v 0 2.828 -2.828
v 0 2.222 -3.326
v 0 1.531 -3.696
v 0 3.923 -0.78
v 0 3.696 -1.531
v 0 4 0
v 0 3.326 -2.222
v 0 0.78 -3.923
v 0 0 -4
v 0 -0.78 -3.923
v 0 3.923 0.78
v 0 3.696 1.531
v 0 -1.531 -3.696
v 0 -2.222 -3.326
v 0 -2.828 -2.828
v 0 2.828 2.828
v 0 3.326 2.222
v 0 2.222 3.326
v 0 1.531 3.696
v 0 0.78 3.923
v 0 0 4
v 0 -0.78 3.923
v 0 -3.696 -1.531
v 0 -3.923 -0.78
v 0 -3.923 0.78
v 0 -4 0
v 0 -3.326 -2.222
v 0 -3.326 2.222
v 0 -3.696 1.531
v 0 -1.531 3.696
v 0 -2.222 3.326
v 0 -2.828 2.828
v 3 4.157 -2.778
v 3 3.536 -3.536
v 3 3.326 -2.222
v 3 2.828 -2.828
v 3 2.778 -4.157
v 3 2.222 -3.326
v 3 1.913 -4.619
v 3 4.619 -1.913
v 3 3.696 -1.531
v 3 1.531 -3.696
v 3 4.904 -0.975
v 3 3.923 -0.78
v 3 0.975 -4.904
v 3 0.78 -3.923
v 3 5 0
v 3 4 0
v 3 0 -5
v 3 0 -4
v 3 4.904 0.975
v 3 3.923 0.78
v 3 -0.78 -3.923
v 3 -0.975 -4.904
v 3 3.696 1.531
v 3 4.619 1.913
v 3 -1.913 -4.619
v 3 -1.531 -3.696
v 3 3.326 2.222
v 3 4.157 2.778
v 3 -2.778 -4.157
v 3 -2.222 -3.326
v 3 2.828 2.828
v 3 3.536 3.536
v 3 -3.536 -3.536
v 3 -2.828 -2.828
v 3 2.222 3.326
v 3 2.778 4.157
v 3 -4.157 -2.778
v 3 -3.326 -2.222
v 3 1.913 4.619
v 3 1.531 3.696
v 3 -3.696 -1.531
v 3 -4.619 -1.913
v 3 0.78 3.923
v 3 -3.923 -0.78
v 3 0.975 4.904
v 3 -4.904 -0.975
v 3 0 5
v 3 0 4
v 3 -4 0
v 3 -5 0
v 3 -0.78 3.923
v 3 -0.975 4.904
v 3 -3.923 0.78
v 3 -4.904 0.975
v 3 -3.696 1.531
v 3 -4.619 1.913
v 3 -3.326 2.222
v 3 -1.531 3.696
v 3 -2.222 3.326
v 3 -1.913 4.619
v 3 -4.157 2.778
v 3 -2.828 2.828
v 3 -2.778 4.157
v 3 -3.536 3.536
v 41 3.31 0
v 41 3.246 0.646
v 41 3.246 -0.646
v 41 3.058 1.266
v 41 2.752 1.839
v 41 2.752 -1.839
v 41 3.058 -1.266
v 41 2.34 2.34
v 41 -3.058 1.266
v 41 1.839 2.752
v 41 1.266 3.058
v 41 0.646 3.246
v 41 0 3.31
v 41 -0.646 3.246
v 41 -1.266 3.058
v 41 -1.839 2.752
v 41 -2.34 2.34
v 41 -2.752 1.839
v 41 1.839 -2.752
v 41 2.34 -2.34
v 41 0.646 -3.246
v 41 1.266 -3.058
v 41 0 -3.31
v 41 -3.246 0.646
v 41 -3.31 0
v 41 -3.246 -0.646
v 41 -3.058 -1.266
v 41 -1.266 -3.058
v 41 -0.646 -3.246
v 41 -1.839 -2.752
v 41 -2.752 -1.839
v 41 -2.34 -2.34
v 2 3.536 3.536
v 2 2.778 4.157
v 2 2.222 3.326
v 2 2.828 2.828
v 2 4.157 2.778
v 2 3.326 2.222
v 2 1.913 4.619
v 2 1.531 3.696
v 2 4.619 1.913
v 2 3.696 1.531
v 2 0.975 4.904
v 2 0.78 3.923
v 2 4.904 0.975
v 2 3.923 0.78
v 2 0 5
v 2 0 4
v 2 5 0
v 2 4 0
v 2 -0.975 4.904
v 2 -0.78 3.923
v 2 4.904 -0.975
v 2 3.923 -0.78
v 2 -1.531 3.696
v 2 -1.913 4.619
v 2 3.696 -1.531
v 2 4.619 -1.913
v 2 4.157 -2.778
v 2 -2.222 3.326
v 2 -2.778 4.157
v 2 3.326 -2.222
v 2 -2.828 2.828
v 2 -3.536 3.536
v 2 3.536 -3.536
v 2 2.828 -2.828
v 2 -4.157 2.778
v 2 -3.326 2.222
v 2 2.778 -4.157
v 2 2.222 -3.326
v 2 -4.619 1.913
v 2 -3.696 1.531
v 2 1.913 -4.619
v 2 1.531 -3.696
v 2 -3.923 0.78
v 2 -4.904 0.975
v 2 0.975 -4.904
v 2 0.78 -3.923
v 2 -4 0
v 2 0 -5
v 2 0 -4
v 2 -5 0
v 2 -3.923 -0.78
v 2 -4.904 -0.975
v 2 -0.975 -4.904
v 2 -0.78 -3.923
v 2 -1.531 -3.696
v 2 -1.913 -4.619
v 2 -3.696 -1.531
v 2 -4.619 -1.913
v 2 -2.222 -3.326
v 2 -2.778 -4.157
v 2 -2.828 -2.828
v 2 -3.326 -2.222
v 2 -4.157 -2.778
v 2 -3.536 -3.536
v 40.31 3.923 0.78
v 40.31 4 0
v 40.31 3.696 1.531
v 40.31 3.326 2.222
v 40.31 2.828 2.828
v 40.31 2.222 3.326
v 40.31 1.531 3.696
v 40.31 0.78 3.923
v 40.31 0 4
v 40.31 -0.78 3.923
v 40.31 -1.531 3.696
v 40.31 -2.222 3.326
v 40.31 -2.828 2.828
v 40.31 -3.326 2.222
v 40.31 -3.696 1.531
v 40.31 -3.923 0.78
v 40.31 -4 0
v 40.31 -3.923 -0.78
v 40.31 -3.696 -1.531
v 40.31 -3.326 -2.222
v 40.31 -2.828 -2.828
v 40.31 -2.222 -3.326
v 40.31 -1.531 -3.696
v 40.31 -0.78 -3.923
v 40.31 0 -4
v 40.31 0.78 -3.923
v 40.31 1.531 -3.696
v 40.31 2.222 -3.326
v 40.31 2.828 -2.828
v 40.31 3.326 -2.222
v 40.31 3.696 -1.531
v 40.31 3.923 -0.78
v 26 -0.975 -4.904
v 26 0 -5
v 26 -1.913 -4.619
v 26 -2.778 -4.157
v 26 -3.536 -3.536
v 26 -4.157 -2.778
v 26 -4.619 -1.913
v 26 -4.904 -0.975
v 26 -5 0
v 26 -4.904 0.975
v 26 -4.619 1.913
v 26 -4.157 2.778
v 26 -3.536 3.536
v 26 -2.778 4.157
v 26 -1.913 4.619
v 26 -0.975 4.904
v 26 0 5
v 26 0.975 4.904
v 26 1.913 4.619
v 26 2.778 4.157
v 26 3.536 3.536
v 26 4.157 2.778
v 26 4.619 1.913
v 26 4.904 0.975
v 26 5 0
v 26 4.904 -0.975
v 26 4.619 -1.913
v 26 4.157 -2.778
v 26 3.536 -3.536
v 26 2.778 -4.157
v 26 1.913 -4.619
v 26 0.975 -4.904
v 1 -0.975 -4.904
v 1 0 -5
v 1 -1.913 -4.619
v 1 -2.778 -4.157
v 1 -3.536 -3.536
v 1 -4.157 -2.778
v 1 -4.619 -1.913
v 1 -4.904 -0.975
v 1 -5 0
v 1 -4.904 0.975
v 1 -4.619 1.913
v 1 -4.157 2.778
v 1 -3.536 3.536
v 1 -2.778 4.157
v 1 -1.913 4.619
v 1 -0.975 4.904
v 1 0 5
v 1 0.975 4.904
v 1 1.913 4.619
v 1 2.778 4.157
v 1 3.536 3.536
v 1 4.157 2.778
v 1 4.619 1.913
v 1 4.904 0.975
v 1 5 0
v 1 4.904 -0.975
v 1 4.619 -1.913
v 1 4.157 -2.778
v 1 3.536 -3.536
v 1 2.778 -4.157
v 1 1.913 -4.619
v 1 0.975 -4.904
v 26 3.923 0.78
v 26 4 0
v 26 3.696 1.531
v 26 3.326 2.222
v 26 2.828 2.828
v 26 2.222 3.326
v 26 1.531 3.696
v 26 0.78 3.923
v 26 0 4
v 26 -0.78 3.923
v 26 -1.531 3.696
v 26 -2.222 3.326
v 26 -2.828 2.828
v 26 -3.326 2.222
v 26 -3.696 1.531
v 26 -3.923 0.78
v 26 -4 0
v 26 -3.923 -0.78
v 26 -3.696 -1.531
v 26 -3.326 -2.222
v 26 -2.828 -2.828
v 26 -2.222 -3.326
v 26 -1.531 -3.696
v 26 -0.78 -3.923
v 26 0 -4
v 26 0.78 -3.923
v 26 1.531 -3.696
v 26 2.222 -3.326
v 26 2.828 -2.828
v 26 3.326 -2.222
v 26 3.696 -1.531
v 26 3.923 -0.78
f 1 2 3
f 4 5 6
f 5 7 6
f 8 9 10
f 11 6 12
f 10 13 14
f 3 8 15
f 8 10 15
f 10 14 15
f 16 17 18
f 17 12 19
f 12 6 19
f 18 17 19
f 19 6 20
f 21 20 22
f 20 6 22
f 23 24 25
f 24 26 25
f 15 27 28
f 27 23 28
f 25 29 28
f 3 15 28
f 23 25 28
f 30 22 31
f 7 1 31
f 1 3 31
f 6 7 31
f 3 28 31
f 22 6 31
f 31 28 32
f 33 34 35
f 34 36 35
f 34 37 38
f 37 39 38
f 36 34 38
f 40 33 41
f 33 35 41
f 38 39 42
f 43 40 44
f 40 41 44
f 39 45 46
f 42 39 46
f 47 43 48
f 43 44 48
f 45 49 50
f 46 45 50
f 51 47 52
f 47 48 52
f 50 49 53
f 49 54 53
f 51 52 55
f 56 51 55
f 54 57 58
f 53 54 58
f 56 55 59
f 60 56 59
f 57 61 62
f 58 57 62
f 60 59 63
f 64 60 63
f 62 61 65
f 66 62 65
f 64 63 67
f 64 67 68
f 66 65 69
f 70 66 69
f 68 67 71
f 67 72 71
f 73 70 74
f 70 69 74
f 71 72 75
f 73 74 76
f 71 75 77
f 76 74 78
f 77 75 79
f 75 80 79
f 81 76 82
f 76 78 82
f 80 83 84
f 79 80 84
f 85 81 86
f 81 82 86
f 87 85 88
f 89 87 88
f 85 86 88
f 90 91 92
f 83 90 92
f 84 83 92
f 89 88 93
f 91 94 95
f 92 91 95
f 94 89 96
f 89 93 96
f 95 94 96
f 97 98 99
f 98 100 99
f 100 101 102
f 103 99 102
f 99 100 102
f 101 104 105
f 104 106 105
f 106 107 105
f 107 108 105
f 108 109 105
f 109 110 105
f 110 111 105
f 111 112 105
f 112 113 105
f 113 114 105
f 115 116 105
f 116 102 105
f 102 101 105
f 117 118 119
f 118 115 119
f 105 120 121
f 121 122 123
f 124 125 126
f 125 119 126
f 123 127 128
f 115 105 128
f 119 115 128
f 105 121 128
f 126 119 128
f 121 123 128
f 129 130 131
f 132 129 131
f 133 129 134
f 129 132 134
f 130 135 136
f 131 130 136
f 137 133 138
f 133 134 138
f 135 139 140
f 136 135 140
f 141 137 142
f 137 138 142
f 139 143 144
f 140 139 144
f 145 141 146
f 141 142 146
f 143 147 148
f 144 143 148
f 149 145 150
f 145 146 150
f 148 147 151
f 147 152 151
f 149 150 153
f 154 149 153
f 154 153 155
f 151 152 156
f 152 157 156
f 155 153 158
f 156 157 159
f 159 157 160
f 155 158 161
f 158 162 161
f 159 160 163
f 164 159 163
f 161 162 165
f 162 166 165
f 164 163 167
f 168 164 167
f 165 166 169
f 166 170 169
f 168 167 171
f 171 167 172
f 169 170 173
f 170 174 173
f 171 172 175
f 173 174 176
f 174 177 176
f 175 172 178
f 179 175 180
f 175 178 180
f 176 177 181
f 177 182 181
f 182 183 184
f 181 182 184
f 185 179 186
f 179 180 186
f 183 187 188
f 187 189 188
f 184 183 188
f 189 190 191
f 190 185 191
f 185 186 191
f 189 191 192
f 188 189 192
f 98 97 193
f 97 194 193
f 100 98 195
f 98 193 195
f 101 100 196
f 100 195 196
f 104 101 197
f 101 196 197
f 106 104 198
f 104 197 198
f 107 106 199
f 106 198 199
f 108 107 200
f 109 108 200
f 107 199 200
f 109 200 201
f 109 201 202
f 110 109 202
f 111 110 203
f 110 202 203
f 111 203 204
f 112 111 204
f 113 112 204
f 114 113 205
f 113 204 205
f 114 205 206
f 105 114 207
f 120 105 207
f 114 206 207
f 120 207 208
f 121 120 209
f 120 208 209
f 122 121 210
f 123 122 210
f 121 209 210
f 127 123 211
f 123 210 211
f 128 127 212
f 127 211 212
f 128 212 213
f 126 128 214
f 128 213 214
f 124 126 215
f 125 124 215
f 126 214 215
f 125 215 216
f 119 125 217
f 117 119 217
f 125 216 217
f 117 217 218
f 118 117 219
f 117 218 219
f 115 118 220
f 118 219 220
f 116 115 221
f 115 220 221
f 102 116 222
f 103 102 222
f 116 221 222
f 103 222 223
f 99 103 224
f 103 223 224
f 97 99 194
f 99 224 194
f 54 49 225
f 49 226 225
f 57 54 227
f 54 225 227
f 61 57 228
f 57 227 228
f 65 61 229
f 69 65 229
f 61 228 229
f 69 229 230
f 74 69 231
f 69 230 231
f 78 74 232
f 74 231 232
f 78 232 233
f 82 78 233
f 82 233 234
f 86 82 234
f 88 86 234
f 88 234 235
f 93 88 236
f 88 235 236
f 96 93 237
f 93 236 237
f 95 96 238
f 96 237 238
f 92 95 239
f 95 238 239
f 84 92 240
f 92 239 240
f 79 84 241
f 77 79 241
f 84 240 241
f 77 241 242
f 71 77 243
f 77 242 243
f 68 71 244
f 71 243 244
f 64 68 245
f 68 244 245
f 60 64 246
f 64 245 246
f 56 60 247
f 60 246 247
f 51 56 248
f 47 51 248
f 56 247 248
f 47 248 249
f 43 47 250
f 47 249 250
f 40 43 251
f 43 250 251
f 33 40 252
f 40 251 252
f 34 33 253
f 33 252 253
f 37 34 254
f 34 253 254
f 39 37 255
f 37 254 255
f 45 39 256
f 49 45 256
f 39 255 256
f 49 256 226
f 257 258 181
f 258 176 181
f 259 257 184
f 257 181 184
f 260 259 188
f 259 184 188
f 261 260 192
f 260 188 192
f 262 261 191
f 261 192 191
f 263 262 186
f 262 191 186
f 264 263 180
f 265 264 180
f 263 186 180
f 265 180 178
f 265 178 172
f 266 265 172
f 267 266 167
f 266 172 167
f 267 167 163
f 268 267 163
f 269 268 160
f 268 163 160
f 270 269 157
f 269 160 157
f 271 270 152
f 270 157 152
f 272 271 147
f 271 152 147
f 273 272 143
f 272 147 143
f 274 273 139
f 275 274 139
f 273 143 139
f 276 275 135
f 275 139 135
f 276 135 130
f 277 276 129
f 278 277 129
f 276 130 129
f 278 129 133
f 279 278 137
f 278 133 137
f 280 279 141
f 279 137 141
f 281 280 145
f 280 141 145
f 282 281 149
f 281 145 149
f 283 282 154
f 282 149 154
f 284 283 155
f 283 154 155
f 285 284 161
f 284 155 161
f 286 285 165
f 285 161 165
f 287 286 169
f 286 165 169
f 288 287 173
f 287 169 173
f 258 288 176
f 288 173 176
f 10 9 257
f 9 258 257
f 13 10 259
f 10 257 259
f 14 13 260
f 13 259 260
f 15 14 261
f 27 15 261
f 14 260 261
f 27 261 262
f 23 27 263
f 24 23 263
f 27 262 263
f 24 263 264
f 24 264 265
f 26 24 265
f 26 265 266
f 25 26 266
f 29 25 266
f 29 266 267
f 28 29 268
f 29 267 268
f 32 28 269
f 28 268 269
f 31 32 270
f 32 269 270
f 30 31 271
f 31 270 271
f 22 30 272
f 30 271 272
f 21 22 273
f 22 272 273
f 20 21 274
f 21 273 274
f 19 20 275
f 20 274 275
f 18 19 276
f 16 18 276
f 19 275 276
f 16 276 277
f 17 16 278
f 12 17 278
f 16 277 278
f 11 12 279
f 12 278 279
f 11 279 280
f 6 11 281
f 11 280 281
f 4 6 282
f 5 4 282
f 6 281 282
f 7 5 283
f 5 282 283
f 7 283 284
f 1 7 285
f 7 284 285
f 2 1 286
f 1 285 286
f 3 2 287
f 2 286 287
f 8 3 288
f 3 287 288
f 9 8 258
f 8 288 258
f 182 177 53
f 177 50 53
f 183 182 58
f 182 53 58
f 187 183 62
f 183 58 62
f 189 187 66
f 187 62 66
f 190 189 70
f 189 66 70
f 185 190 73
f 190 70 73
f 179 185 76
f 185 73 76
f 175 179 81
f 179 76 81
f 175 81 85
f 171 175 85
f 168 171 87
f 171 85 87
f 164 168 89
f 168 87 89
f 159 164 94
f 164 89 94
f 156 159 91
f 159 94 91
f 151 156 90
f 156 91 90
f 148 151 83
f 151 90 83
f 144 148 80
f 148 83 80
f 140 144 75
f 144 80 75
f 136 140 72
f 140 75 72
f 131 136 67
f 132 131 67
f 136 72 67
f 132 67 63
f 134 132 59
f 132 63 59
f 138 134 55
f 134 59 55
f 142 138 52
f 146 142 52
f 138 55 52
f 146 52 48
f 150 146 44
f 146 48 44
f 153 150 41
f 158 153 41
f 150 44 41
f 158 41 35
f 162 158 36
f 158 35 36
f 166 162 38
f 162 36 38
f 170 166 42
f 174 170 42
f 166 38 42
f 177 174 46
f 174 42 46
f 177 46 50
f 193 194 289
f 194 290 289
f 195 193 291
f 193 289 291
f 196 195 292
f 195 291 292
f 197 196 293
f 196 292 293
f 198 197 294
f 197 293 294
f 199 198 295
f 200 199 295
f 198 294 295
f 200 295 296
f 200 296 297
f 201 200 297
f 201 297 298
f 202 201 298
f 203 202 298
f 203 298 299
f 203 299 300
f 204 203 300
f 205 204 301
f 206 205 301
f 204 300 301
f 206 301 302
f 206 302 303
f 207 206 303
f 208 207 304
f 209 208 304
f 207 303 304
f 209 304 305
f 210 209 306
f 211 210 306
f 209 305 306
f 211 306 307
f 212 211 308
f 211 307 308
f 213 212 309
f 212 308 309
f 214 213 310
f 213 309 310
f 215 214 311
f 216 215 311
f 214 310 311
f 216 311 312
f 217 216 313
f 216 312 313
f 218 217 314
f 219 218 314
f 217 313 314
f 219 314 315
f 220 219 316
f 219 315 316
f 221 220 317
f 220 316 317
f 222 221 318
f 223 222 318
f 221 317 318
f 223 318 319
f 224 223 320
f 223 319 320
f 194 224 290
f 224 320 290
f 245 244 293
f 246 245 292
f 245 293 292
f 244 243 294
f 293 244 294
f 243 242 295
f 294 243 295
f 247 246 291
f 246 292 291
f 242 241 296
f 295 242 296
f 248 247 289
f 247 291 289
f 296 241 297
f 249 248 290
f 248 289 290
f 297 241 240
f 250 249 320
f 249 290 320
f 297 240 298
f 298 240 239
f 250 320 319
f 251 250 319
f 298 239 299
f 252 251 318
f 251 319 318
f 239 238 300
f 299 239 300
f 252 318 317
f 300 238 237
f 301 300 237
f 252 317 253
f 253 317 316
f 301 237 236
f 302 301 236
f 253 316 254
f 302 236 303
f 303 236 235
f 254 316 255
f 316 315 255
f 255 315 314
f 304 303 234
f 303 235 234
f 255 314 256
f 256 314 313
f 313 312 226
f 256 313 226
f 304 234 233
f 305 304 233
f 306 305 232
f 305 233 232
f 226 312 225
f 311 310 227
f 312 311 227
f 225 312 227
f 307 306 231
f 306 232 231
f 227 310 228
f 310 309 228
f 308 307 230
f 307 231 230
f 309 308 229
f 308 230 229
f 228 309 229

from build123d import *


# Read off the part's stored shape, not the designer's step: M8 Machine Threads Stud1
with BuildPart() as part:
    # Sketch1 → Revolve1 (revolve)
    with BuildSketch(Plane(origin=(0, 0, 0), x_dir=(1, 0, 0), z_dir=(0, 1, 0))):
        Polygon((0, 0), (0, 4), (1, 5), (2, 5), (2, 4), (3, 4), (3, 5), (26, 5), (26, 4.25), (41, 4.25), (41, 0), align=None)
    revolve(axis=Axis((41, 0, 0), (-1, 0, 0)))

    # M8 Machine Threads Stud1 outline → M8 Machine Threads Stud1 (revolve, cut)
    with BuildSketch(Plane.YX):
        Polygon((4.25, 41), (3.3095, 41), (4, 40.3095), (4, 26), (4.25, 26), align=None)
    revolve(axis=Axis((0, 0, 0), (1, 0, 0)), mode=Mode.SUBTRACT)


solid = part.part
